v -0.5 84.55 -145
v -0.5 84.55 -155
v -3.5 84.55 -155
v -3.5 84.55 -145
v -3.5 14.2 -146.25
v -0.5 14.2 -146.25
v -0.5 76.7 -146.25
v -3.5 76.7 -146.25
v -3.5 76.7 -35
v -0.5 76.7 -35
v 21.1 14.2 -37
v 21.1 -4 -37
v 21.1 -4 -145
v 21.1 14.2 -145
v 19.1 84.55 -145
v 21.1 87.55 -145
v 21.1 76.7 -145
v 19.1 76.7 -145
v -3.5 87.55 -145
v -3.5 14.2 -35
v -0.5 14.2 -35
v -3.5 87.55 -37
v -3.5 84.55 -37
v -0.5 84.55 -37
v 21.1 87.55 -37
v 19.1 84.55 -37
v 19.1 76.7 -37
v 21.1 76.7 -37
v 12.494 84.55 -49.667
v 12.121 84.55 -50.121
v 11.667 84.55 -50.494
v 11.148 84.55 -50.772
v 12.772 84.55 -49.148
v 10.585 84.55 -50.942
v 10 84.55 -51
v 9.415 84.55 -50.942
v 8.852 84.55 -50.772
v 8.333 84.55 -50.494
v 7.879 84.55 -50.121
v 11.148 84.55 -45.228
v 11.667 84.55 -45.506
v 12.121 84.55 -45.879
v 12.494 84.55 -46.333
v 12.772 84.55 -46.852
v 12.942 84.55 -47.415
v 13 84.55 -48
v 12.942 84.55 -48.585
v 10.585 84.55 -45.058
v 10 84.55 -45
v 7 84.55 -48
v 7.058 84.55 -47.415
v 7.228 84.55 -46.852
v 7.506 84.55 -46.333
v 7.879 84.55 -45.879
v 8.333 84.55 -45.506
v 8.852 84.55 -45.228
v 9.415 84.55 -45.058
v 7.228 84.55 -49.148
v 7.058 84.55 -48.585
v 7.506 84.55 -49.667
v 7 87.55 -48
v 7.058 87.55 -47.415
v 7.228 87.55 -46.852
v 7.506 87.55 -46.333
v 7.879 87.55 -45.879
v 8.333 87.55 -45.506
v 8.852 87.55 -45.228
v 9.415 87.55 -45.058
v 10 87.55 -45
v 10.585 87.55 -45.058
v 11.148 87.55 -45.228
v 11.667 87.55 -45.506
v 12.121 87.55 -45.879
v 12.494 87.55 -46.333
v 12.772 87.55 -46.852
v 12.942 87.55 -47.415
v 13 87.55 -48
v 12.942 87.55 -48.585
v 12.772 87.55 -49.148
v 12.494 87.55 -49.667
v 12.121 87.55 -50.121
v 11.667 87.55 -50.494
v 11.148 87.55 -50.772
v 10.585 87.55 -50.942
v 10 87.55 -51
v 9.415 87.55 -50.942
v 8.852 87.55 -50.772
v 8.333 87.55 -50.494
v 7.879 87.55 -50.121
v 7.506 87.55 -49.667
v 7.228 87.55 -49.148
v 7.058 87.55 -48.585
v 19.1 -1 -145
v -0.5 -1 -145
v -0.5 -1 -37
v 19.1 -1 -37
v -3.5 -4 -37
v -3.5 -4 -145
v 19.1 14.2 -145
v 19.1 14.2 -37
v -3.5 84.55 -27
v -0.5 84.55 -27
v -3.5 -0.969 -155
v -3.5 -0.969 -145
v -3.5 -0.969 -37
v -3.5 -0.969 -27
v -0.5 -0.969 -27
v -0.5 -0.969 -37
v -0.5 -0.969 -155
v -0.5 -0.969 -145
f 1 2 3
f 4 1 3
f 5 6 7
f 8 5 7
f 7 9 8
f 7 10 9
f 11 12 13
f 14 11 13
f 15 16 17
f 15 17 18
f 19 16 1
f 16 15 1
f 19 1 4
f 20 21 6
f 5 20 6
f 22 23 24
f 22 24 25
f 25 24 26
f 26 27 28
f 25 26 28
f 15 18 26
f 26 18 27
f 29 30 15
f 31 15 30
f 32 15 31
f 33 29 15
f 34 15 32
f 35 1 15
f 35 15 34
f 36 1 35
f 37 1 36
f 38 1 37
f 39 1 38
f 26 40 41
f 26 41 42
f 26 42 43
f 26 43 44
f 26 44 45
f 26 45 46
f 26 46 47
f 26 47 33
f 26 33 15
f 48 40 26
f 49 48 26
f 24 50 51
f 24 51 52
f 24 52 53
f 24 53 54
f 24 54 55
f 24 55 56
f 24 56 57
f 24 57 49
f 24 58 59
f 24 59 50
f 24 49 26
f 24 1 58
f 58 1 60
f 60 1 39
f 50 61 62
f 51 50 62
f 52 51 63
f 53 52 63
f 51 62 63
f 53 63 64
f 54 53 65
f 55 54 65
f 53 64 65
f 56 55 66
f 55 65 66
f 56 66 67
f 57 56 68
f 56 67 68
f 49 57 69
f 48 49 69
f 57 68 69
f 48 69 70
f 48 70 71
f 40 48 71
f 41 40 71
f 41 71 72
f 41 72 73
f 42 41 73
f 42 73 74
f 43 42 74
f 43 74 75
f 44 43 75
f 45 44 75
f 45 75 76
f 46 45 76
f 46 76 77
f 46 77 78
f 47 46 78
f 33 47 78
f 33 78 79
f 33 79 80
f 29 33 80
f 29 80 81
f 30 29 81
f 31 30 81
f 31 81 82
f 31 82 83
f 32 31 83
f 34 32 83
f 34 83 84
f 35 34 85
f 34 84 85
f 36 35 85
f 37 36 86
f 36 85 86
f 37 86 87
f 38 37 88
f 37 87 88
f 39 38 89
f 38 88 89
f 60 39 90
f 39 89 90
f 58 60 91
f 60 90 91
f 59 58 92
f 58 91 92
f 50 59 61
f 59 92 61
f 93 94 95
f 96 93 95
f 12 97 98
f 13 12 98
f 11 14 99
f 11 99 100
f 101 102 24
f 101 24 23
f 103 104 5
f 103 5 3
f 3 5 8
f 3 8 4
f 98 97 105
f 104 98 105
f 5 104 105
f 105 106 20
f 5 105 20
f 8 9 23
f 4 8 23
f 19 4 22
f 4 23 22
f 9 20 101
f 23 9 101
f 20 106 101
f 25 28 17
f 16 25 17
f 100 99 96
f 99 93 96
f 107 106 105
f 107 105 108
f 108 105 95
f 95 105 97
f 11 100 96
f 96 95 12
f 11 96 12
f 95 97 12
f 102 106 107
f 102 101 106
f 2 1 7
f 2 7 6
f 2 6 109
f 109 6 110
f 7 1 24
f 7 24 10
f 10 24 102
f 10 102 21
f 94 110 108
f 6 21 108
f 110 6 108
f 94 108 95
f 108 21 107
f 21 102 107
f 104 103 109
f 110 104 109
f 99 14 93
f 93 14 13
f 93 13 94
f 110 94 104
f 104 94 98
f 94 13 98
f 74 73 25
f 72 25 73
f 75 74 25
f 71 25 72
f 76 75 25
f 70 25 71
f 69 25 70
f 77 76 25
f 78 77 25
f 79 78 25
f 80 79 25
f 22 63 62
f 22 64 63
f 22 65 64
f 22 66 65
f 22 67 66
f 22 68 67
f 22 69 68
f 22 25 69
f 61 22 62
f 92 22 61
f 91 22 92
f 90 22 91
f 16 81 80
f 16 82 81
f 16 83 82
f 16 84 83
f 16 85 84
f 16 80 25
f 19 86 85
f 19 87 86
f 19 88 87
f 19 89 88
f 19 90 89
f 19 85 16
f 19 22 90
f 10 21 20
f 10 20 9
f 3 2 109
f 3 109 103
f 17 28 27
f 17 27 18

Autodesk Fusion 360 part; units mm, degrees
sketch "Sketch1" plane through (0, 0, 0) normal (1, 0, 0) x (0, 0, -1)
  line L0 (0, 0) -> (182, 0)
  line L1 (182, 0) -> (182, 83.55)
  line L2 (182, 83.55) -> (0, 83.55)
  line L3 (0, 83.55) -> (0, 0)
  dimension "d1" = 83.55
  dimension "d2" = 182
extrude "Extrude1" add sketch "Sketch1" along normal blind 18.6 makes body 1
sketch "Sketch2" plane through (18.6, 0, 0) normal (1, 0, 0) x (0, 0, -1)
  line L0 (0, 83.55) -> (0, 0)
  line L1 (0, 0) -> (182, 0)
  line L2 (182, 0) -> (182, 83.55)
  line L3 (182, 83.55) -> (0, 83.55)
  line L4 (0, 41.775) -> (37, 41.775)
  line L5 (182, 41.775) -> (145, 41.775)
  line L6 (37, 41.775) -> (145, 41.775)
  line L7 (145, 41.775) -> (145, 83.55)
  line L8 (145, 83.55) -> (37, 83.55)
  line L9 (37, 83.55) -> (37, 41.775)
  line L10 (145, 41.775) -> (37, 41.775)
  line L11 (37, 41.775) -> (37, 0)
  line L12 (37, 0) -> (145, 0)
  line L13 (145, 0) -> (145, 41.775)
  arc A0 (145, 0) -> (145, 83.55) centre (139.9169, 41.775) ccw
  arc A1 (37, 83.55) -> (37, 0) centre (42.0831, 41.775) ccw
  dimension "d5" = 37
  dimension "d6" = 37
extrude "Extrude2" cut sketch "Sketch2" against normal blind 90 contours L0 L3 A1 | L0 L1 A1 | L2 L3 A0 | L1 L2 A0 bodies 1
sketch "Sketch3" plane through (18.6, 0, 0) normal (1, 0, 0) x (0, 0, -1)
  arc A0 (37, 83.55) -> (37, 0) centre (42.0831, 41.775) ccw
  line L0 (37, 0) -> (145, 0)
  arc A1 (145, 0) -> (145, 83.55) centre (139.9169, 41.775) ccw
  line L1 (145, 83.55) -> (37, 83.55)
  line L2 (145, 83.55) -> (193.2382, 83.55)
  line L3 (193.2382, 83.55) -> (193.2382, 74.55)
  line L4 (193.2382, 74.55) -> (145, 74.55)
  line L5 (145, 74.55) -> (145, 83.55)
  line L6 (37, 83.55) -> (-37.63, 83.55)
  line L7 (-37.63, 83.55) -> (-37.63, 74.55)
  line L8 (-37.63, 74.55) -> (37, 74.55)
  line L9 (37, 74.55) -> (37, 83.55)
  line L10 (37, 0) -> (-32.6872, 0)
  line L11 (-32.6872, 0) -> (-32.6872, 9)
  line L12 (-32.6872, 9) -> (37, 9)
  line L13 (37, 9) -> (37, 0)
  line L14 (145, 0) -> (203.1237, 0)
  line L15 (203.1237, 0) -> (203.1237, 9)
  line L16 (203.1237, 9) -> (145, 9)
  line L17 (145, 9) -> (145, 0)
  dimension "d9" = 9
  dimension "d10" = 9
  dimension "d11" = 9
  dimension "d12" = 9
extrude "Extrude3" cut sketch "Sketch3" against normal blind 6.25 contours A0 L8 L9 | A1 L4 L5 | A0 L12 L13 | A1 L16 L17 bodies 1
sketch "Sketch4" plane through (18.6, 0, 0) normal (1, 0, 0) x (0, 0, -1)
  line L0 (145, 74.55) -> (145, 83.55)
  line L1 (145, 83.55) -> (37, 83.55)
  line L2 (37, 83.55) -> (37, 74.55)
  line L3 (37, 74.55) -> (15.6864, 74.55)
  arc A0 (15.6864, 74.55) -> (15.6864, 9) centre (42.0831, 41.775) ccw
  line L4 (15.6864, 9) -> (37, 9)
  line L5 (37, 9) -> (37, 0)
  line L6 (37, 0) -> (145, 0)
  line L7 (145, 0) -> (145, 9)
  line L8 (145, 9) -> (166.3136, 9)
  arc A1 (166.3136, 9) -> (166.3136, 74.55) centre (139.9169, 41.775) ccw
  line L9 (166.3136, 74.55) -> (145, 74.55)
  line L10 (37, 83.55) -> (37, 84.55)
  line L11 (145, 83.55) -> (145, 84.55)
  line L12 (145, 84.55) -> (37, 84.55)
  line L13 (37, 84.55) -> (37, 87.55)
  line L14 (37, 87.55) -> (145, 87.55)
  line L15 (145, 87.55) -> (145, 84.55)
  dimension "d15" = 1
  dimension "d16" = 1
  dimension "d17" = 3
extrude "Extrude4" add sketch "Sketch4" against normal blind 25 separate body contours L12 L13 L14 L15 makes body 2
sketch "Sketch5" plane through (18.6, 0, 0) normal (1, 0, 0) x (0, 0, -1)
  line L0 (145, 74.55) -> (145, 83.55)
  line L1 (145, 83.55) -> (37, 83.55)
  line L2 (37, 83.55) -> (37, 74.55)
  line L3 (37, 74.55) -> (15.6864, 74.55)
  arc A0 (15.6864, 74.55) -> (15.6864, 9) centre (42.0831, 41.775) ccw
  line L4 (15.6864, 9) -> (37, 9)
  line L5 (37, 9) -> (37, 0)
  line L6 (37, 0) -> (145, 0)
  line L7 (145, 0) -> (145, 9)
  line L8 (145, 9) -> (166.3136, 9)
  arc A1 (166.3136, 9) -> (166.3136, 74.55) centre (139.9169, 41.775) ccw
  line L9 (166.3136, 74.55) -> (145, 74.55)
  line L10 (0, 41.775) -> (35, 41.775)
  line L11 (35, 41.775) -> (40, 41.775)
  line L12 (40, 41.775) -> (40, 0)
  line L13 (40, 0) -> (35, 0)
  line L14 (35, 0) -> (35, 41.775)
  line L15 (37, 0) -> (35, 0)
  line L16 (35, 0) -> (35, 14.2)
  line L17 (35, 14.2) -> (37, 14.2)
  line L18 (37, 14.2) -> (37, 0)
  line L19 (35, 14.2) -> (146.25, 14.2)
  line L20 (146.25, 14.2) -> (146.25, 76.7)
  line L21 (146.25, 76.7) -> (35, 76.7)
  line L22 (35, 76.7) -> (35, 14.2)
  dimension "d20" = 35
  dimension "d21" = 14.2
  dimension "d22" = 111.25
  dimension "d23" = 62.5
extrude "Extrude5" add 1 faces at (12.35, 80.1801, -35.0838) along direction (1, 0, 0) blind 6.25 on bodies 1 bodies 1
extrude "Extrude6" add 1 faces at (12.35, 80.1801, -146.9162) along direction (1, 0, 0) blind 6.25 on bodies 1 bodies 1
extrude "Extrude7" cut sketch "Sketch5" against normal blind 1 contours L0 L2 L3 L9 L11 L12 L19 L20 L21 L22 | L0 L9 L20 L21 | L2 L3 L21 L22 | L11 L12 L14 L17 L19 L22 bodies 1
sketch "Sketch6" plane through (0, 87.55, 0) normal (0, 1, 0) x (-1, 0, 0)
  line L0 (-18.6, -37) -> (-18.6, -145)
  line L1 (-18.6, -145) -> (6.4, -145)
  line L2 (6.4, -145) -> (6.4, -37)
  line L3 (6.4, -37) -> (-18.6, -37)
  line L4 (-10, -37) -> (-10, -45)
  circle A0 centre (-10, -48) radius 3
  dimension "d30" = 8
  dimension "d31" = 6
extrude "Extrude8" cut sketch "Sketch6" against normal blind 9 contours A0 bodies 2
sketch "Sketch7" plane through (0, 84.55, 0) normal (0, -1, 0) x (1, 0, 0)
  circle A0 centre (10, -48) radius 3
  line L0 (18.6, -145) -> (18.6, -37)
  line L1 (18.6, -37) -> (-6.4, -37)
  line L2 (-6.4, -37) -> (-6.4, -145)
  line L3 (-6.4, -145) -> (18.6, -145)
sketch "Sketch8" plane through (0, 0, 0) normal (0, -1, 0) x (1, 0, 0)
  line L0 (18.6, -37) -> (12.35, -37)
  line L1 (12.35, -37) -> (0, -37)
  line L2 (0, -37) -> (0, -145)
  line L3 (0, -145) -> (12.35, -145)
  line L4 (12.35, -145) -> (18.6, -145)
  line L5 (18.6, -145) -> (18.6, -37)
  line L6 (0, -145) -> (-0.5, -145)
  line L7 (-0.5, -145) -> (-6.4, -145)
  line L8 (-6.4, -145) -> (-6.4, -37)
  line L9 (-6.4, -37) -> (-0.5, -37)
  line L10 (-0.5, -37) -> (-0.5, -145)
  point P0 (-6.4, -37)
  dimension "d34" = 0.5
extrude "Extrude9" add sketch "Sketch8" against normal blind 85 contours L7 L8 L9 L10 bodies 2
extrude "Extrude10" cut 1 faces at (-6.4, 57.3667, -109) along direction (1, 0, 0) blind 2.9 on bodies 2 bodies 2
extrude "Extrude11" add 1 faces at (-1.5, 0, -109) along direction (0, -1, 0) blind 4 on bodies 2 bodies 2
sketch "Sketch9" plane through (-0.5, 0, 0) normal (1, 0, 0) x (0, 0, -1)
  line L0 (145, 84.55) -> (37, 84.55)
  line L1 (37, 84.55) -> (37, -4)
  line L2 (37, -4) -> (145, -4)
  line L3 (145, -4) -> (145, 84.55)
  line L4 (37, -4) -> (145, -4)
  line L5 (145, -4) -> (145, -1)
  line L6 (145, -1) -> (37, -1)
  line L7 (37, -1) -> (37, -4)
extrude "Extrude12" add sketch "Sketch9" along normal blind 24 contours L1 L2 L3 L4 L5 L6 L7 bodies 2
extrude "Extrude13" add 1 faces at (18.6, 85.55, -73) along direction (1, 0, 0) blind 5 on bodies 2 bodies 2
sketch "Sketch10" plane through (0, -1, 0) normal (0, 1, 0) x (-1, 0, 0)
  line L0 (0.5, -145) -> (0.5, -37)
  line L1 (0.5, -37) -> (-23.5, -37)
  line L2 (-23.5, -37) -> (-23.5, -145)
  line L3 (-23.5, -145) -> (0.5, -145)
  line L4 (-23.5, -145) -> (-19.1, -145)
  line L5 (-19.1, -145) -> (-19.1, -37)
  line L6 (-19.1, -37) -> (-23.5, -37)
  line L7 (-23.5, -37) -> (-23.5, -145)
  dimension "d45" = 4.4
extrude "Extrude14" add sketch "Sketch10" along normal blind 88 contours L1 L2 L3 L4 L5 L6 L7 bodies 2
extrude "Extrude15" cut 1 faces at (23.6, 85.55, -73) along direction (-1, 0, 0) blind 0.1 on bodies 2 bodies 2
sketch "Sketch11" plane through (23.5, 0, 0) normal (1, 0, 0) x (0, 0, -1)
  line L0 (37, 87.55) -> (37, -4)
  line L1 (37, -4) -> (145, -4)
  line L2 (145, -4) -> (145, 87.55)
  line L3 (145, 87.55) -> (37, 87.55)
  line L4 (37, 76.7) -> (145, 76.7)
  line L5 (145, 76.7) -> (145, 14.2)
  line L6 (145, 14.2) -> (37, 14.2)
  line L7 (37, 14.2) -> (37, 76.7)
  point P0 (37, 83.55)
extrude "Extrude16" cut sketch "Sketch11" against normal blind 20 contours L0 L2 L4 L5 L6 L7 bodies 2
extrude "Extrude17" cut 1 faces at (23.5, 79.3167, -109) along direction (-1, 0, 0) blind 2.4 on bodies 2 bodies 2
extrude "Extrude18" cut 1 faces at (23.5, 8.1333, -109) along direction (-1, 0, 0) blind 2.4 on bodies 2 bodies 2
sketch "Sketch12" plane through (0, 0, -37) normal (0, 0, 1) x (1, 0, 0)
  line L0 (21.1, -4) -> (21.1, 14.2)
  line L1 (21.1, 14.2) -> (19.1, 14.2)
  line L2 (19.1, 14.2) -> (19.1, -1)
  line L3 (19.1, -1) -> (-0.5, -1)
  line L4 (-0.5, -1) -> (-0.5, 84.55)
  line L5 (-0.5, 84.55) -> (19.1, 84.55)
  line L6 (19.1, 84.55) -> (19.1, 76.7)
  line L7 (19.1, 76.7) -> (21.1, 76.7)
  line L8 (21.1, 76.7) -> (21.1, 87.55)
  line L9 (21.1, 87.55) -> (-3.5, 87.55)
  line L10 (-3.5, 87.55) -> (-3.5, -4)
  line L11 (-3.5, -4) -> (21.1, -4)
  line L12 (-0.5, 84.55) -> (-3.5, 84.55)
  line L13 (-3.5, 84.55) -> (-3.5, -0.969)
  line L14 (-3.5, -0.969) -> (-0.5, -0.969)
  line L15 (-0.5, -0.969) -> (-0.5, 84.55)
extrude "Extrude19" add sketch "Sketch12" along normal blind 10 contours L4 L10 L12 L13 L14 L15 bodies 2
sketch "Sketch13" plane through (0, 0, -145) normal (0, 0, -1) x (-1, 0, 0)
  line L0 (-21.1, 14.2) -> (-21.1, -4)
  line L1 (-21.1, -4) -> (3.5, -4)
  line L2 (3.5, -4) -> (3.5, 87.55)
  line L3 (3.5, 87.55) -> (-21.1, 87.55)
  line L4 (-21.1, 87.55) -> (-21.1, 76.7)
  line L5 (-21.1, 76.7) -> (-19.1, 76.7)
  line L6 (-19.1, 76.7) -> (-19.1, 84.55)
  line L7 (-19.1, 84.55) -> (0.5, 84.55)
  line L8 (0.5, 84.55) -> (0.5, -1)
  line L9 (0.5, -1) -> (-19.1, -1)
  line L10 (-19.1, -1) -> (-19.1, 14.2)
  line L11 (-19.1, 14.2) -> (-21.1, 14.2)
  line L12 (0, 84.55) -> (3.5, 84.55)
  line L13 (3.5, 84.55) -> (3.5, -0.969)
  line L14 (3.5, -0.969) -> (0, -0.969)
  line L15 (0, -0.969) -> (0, 84.55)
  point P0 (0, 84.55)
  point P1 (3.5, -0.969)
extrude "Extrude20" add sketch "Sketch13" along normal blind 10 contours L2 L8 L12 L13 L14 bodies 2
extrude "Extrude21" cut 1 faces at (17.6, 55.8667, -72.0833) along direction (-1, 0, 0) blind 71 on bodies 1 bodies 2
hidden bodies 1
